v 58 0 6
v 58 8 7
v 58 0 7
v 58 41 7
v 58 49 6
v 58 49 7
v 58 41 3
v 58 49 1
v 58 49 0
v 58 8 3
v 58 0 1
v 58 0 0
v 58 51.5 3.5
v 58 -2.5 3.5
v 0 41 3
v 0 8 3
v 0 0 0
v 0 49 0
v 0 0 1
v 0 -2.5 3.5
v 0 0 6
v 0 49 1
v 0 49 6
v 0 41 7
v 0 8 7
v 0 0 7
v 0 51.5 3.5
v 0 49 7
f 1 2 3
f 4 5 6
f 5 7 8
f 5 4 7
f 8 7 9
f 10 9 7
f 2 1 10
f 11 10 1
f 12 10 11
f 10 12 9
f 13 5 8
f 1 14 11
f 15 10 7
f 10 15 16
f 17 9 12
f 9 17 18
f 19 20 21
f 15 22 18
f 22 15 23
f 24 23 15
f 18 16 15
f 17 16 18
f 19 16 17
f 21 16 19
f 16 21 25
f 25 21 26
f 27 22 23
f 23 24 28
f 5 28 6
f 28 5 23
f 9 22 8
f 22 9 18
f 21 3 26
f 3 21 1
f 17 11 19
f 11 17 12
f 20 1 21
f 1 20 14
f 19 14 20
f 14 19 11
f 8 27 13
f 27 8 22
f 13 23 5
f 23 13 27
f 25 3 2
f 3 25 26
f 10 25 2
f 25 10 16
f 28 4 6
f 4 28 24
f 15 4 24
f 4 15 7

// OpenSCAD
// file: bbs_shapes.scad
//
// This is a catalogu of shapes that are used in other structures.  Each shape is
// parameterized to make them more flexible.
//
//===================================
// Triangular prism type 1.  This takes the form of an isosolese right triangle.
// The triangle is oriented with the hypotonuse in the y direction.  Extrusion is in the
// z direction.  Origin is at one end of the hypotonuse.
//
// Parameters
// s - size of triangle (length of hypotonuse)
// l - length of prism
//
module bbs_prism1(s, l)
{
    linear_extrude(height=l) polygon([[0, 0], [0, s], [s/2, s/2]]);
}
//
//===================================
// Triangular prism type 2.  This takes the form of an isosolese right triangle.
// The triangle is oriented with the right angle at the origin.  Extrusion is in the
// z direction.
//
// Parameters
// s - size of triangle (length of sides)
// l - length of prism
//
module bbs_prism2(s, l)
{
    linear_extrude(height=l) polygon([[0, 0], [0, s], [s, 0]]);
}
//
//===================================
// Fillet.  This is a square with a circle removed from it.  The circle
// has a radius equal to the square's sides and is positioned at one of the corners.  The
// length is in the z  direction.
//
// Parameters
// s - size of fillet
// l - length of extrusion
//
module bbs_fillet(s, l)
{
    difference()
    {
        cube([s, s, l]);
        translate([s, s, -0.1]) cylinder(r=s, h=l+0.2);
    }
}
//
//===================================
// Spacer.  This is a cylinder with a cylinder removed from the center of it.  It
// would typically be used to around a bolt to add some space like a standoff or
// as a washer.
//
// Parameters
// od - outside diameter
// id - inside diameter
// height - height
//
module bbs_spacer(od, id, height)
{
    difference()
    {
        cylinder(r=od/2, h=height, $fn=20);
        translate([0, 0, -0.1]) cylinder(r=id/2, h=height + 0.2, $fn=20);
    }
}
//
// Examples
//
//bbs_prism1(3, 5);
//translate([0, 7, 0]) bbs_prism2(3, 5);
//translate([7, 0, 0]) bbs_fillet(3, 5);
//bbs_spacer(23, 10, 16);
bbs_spacer(6, 4, 2);
// file: bbs_constants.scad
//
// This is a collection of constants that are often needed in various models.
//
// Use functions for constants that should be exported
//
// Sizes for the mini rack
//
function bbs_mini_rack_width() = 72;
function bbs_mini_rack_length() = 100;
//
// Sizes for the standard size rack
//
function bbs_std_rack_width() = 161;
function bbs_std_rack_length() = 200;
//
// Sizes for screw holes.  These are composed of the measured diameter plus a little "fudge factor" to be
// determined.  This is necessary since the printer makes holes a little smaller than they should be
// and to provide a little clearance.
//
function screw_2_size() = 2.10 + 0.25;
function screw_4_size() = 2.80 + 0.15;
function screw_6_size() = 3.38 + 0.3;
function screw_8_size() = 4.06 + 0.3;
function screw_m4_size() = 3.90 + 0.4;
// main file
//
// Basic sliding tray to mount in a rack.  Varients of this tray can
// hold different electronic devices.  The knobs parameter is a boolean
// to determine in knobs are added to the tray (the default) or not.
// One may wish to omit the knobs if, for example, one wants a panel to
// cover the tray.
//
use <bbs_constants.scad>
use <bbs_shapes.scad>
//
// The module is provided in two versions.  In the _raw version, the length and width can be set to any
// size in units of 1mm.  In the non-_raw version, the length and width are set in units of frames (same
// as the height).  This is basically 20mm units with a little bit of processing.  Note that since the
// values are actually floating point, you can select any value, but don't do that.
//
//
// Set rack_width and rack_length to appropriate sizes for rack.  Currently functions for standard (std)
// and mini sizes are available, or you can pick your own size.
//
//rack_width = bbs_std_rack_width() - 1;
//rack_length = bbs_std_rack_length() - 2;
//
// The parameter "frames" sets the height of the rack in number of screw holes.  The base rack with no
// screw holes is actually one frame tall.  Setting this parameter to less than 1 will probably not
// provide satisfactory results.
//
module bbs_tray(frames_wide, frames_long, frames_high)
{
    bbs_tray_raw(frames_wide*20 + 9, (frames_long + 1)*20 - 2, frames_high);
}
//
module bbs_tray_raw(rack_width, rack_length, knobs=true)
{
    difference()
    {
        union()
        {
            cube([rack_length, rack_width, 3], center=false); // Base
            translate([0, 0, 6]) rotate([0, 90, 0]) rotate([0, 0, -90]) bbs_prism1(5, rack_length); // Rail
            translate([0, rack_width, 1]) rotate([0, 90, 0]) rotate([0, 0, 90])
                    bbs_prism1(5, rack_length); // Rail
            translate([0, 0, 0]) cube([rack_length, 8, 7], center=false); // Side
            translate([0, rack_width - 8, 0]) cube([rack_length, 8, 7], center=false); // Side
//
            if (knobs)
            {
                translate([rack_length, 3, 4]) rotate([0, 90, 0]) cylinder($fn=12, h=5, r=3);
                translate([rack_length + 5, 0, 0]) cube([5, 8, 8], center=false); // Knob
                translate([rack_length, rack_width - 4, 4]) rotate([0, 90, 0]) cylinder($fn=12, h=5, r=3);
                translate([rack_length + 5, rack_width - 8, 0]) cube([5, 8, 8], center=false); // Knob
            }
        }
        union()
        {
        }
    }
}

bbs_tray(2, 2, false);
